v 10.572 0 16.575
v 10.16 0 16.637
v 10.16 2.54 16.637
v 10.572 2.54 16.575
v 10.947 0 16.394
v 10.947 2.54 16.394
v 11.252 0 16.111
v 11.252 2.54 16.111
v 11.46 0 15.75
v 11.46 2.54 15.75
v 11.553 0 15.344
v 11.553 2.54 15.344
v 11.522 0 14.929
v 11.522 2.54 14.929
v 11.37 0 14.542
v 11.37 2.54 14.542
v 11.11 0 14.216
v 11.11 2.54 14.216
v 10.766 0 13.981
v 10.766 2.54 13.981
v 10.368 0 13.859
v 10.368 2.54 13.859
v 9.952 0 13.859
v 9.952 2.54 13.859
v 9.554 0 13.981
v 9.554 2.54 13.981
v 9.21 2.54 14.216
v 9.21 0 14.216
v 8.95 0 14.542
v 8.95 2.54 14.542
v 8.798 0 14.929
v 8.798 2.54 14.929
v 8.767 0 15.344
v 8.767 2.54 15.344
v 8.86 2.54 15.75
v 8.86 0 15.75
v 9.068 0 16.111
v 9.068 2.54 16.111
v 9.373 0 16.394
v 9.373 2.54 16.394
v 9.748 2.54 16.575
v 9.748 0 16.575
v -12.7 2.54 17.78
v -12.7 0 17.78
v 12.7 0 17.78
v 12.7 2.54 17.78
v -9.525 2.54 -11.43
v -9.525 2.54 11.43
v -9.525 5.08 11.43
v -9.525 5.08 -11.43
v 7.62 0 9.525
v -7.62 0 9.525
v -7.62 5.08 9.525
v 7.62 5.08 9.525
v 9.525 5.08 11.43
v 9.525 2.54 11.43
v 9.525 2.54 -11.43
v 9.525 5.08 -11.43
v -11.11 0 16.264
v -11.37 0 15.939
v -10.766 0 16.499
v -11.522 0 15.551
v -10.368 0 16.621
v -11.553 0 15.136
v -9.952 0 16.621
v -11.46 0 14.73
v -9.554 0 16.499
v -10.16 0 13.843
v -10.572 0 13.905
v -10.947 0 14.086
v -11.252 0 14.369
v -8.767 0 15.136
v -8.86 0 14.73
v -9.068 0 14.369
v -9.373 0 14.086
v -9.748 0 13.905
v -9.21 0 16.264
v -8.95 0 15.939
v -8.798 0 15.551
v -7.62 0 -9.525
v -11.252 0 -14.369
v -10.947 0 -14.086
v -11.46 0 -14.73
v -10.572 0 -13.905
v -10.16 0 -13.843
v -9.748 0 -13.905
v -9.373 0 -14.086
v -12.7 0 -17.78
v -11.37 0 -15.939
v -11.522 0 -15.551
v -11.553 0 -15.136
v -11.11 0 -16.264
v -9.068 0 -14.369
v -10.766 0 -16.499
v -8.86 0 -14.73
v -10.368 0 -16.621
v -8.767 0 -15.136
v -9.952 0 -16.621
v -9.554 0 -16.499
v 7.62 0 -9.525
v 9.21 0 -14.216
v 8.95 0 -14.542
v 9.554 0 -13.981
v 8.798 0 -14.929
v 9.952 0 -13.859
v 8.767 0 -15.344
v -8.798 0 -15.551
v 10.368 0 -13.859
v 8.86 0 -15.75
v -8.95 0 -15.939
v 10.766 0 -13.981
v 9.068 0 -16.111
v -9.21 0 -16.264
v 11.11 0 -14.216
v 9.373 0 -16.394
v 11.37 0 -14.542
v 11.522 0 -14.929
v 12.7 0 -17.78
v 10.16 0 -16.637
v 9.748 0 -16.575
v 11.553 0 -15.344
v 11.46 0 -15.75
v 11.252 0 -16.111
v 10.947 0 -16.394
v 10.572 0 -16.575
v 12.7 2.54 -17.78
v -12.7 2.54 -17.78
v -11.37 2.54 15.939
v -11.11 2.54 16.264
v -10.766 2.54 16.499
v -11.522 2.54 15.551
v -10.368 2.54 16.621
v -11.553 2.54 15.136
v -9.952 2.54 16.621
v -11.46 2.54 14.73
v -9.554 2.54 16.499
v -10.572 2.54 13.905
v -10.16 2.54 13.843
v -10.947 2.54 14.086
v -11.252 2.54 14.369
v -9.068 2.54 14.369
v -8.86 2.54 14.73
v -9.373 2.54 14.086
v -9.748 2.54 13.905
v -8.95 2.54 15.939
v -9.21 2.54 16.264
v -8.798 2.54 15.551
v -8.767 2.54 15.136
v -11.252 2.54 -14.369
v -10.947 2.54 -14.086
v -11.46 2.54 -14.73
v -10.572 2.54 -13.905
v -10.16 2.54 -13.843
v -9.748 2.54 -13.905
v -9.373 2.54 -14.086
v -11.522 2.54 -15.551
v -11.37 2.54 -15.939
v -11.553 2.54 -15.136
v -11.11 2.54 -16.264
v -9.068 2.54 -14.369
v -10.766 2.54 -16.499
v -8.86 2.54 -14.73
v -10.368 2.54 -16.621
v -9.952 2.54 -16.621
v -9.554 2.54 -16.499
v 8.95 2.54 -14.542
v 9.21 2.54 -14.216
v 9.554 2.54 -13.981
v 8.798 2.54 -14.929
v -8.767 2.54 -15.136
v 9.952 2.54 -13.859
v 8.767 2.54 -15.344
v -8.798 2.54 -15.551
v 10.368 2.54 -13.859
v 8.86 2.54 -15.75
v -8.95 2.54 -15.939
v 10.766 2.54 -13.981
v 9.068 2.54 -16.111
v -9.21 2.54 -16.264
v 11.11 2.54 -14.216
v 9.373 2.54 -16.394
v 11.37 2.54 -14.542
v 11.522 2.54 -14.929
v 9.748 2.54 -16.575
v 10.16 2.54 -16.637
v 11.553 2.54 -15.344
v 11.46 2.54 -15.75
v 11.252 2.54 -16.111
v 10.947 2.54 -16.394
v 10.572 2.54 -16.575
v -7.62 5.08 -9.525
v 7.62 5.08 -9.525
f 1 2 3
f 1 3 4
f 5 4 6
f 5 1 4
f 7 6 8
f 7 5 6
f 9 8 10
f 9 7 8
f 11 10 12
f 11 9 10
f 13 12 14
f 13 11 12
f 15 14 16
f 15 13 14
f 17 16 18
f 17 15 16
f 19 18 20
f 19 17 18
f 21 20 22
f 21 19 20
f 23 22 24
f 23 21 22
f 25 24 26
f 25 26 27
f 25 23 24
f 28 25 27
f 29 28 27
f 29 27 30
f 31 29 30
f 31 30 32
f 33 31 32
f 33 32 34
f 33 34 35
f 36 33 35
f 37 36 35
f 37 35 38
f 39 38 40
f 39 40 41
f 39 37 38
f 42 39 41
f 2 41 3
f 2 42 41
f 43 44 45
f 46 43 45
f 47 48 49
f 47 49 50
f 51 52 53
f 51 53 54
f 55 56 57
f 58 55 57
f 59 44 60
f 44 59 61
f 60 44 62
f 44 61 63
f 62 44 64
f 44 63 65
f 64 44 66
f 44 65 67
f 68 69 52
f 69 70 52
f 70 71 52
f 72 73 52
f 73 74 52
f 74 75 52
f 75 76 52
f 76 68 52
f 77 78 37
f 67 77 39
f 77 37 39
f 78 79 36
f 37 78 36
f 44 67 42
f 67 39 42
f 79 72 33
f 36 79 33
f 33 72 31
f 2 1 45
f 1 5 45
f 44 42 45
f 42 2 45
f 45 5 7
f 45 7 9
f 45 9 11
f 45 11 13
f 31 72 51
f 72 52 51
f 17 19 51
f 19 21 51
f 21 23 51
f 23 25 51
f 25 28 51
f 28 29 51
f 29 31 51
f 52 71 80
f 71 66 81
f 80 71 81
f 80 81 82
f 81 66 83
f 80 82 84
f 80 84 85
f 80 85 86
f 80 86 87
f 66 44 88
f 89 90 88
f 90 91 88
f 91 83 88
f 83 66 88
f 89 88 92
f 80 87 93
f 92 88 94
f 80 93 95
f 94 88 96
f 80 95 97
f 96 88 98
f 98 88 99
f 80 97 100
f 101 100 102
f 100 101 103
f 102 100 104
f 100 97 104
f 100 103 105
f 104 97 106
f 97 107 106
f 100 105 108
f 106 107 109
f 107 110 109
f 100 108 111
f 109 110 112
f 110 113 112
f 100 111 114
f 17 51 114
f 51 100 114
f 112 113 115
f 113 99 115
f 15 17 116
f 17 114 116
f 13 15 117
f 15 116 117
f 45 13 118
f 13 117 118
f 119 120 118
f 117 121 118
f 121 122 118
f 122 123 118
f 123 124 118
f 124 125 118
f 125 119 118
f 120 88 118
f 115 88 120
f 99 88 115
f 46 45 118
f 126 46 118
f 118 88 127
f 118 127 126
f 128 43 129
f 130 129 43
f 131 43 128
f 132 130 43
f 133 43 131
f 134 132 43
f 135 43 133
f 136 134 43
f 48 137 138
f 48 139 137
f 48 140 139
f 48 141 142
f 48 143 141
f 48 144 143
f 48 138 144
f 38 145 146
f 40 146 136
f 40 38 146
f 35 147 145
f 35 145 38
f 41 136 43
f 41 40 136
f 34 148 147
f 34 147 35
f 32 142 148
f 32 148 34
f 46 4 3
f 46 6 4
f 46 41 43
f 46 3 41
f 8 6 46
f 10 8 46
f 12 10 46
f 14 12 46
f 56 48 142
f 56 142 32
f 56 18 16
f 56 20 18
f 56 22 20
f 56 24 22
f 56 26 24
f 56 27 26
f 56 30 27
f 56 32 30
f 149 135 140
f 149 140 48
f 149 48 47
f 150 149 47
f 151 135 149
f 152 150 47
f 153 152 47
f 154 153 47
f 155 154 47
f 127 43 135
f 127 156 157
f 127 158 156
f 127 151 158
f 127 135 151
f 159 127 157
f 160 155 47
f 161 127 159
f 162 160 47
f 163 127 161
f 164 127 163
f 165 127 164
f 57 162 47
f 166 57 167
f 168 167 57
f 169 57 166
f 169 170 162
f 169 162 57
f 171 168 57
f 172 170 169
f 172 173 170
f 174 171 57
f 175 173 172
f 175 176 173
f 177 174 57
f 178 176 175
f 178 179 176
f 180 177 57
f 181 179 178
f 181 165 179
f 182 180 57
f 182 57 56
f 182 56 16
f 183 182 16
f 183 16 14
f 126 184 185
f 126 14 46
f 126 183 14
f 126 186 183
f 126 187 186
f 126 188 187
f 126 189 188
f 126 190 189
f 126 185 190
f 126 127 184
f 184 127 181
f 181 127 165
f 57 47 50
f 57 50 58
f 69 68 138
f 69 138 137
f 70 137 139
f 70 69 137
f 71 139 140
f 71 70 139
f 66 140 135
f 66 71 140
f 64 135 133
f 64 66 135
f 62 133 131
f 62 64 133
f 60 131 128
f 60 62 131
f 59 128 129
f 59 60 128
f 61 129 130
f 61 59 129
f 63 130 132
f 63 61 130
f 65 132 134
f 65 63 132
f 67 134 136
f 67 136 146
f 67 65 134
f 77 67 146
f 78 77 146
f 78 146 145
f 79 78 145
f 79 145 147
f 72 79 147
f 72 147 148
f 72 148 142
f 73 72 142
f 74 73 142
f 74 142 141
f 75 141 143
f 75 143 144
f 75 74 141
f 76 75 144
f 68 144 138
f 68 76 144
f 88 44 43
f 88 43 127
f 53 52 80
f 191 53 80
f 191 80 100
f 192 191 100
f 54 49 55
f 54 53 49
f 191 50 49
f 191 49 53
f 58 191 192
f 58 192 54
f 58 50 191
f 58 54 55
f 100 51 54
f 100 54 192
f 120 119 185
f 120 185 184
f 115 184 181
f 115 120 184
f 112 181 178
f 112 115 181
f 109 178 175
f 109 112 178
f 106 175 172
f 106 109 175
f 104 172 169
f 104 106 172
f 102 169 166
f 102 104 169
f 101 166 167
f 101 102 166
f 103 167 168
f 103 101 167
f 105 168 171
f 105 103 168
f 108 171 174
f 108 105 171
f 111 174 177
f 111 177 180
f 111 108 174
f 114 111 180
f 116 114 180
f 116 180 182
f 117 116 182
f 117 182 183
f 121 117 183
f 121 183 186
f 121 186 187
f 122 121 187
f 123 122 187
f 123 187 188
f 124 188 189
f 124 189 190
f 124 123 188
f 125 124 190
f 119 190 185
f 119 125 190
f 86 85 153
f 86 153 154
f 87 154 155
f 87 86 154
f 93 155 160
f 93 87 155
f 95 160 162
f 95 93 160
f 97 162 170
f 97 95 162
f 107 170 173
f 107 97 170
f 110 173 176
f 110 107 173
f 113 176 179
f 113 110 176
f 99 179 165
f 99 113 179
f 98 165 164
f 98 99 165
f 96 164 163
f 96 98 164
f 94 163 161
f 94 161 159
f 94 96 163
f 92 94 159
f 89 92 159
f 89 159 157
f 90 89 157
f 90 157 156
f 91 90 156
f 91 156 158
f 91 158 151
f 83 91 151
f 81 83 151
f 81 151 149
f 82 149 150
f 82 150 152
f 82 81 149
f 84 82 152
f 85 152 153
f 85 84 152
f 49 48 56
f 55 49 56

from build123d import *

# Parameters (mm, degrees)
SKETCH1_W           = 19.05
SKETCH1_H           = 22.86
SKETCH1_W_2         = 15.24
SKETCH1_H_2         = 19.05
BOSS_EXTRUDE1_DEPTH = 5.08
SKETCH3_W           = 25.4
SKETCH3_H           = 35.56
SKETCH3_R           = 1.397
SKETCH3_W_2         = 19.05
SKETCH3_H_2         = 22.86
BOSS_EXTRUDE2_DEPTH = 2.54


with BuildPart() as part:
    # Sketch1 → Boss-Extrude1 (new body)
    with BuildSketch(Plane(origin=(0, 0, 0), x_dir=(1, 0, 0), z_dir=(0, 1, 0))):
        Rectangle(SKETCH1_W, SKETCH1_H)
        Rectangle(SKETCH1_W_2, SKETCH1_H_2, mode=Mode.SUBTRACT)
    extrude(amount=BOSS_EXTRUDE1_DEPTH)

    # Sketch3 → Boss-Extrude2 (add)
    with BuildSketch(Plane(origin=(0, 0, 0), x_dir=(1, 0, 0), z_dir=(0, 1, 0))):
        Rectangle(SKETCH3_W, SKETCH3_H)
        with Locations(Location((-10.16, 15.24, 0), (0, 0, 270))):
            Circle(SKETCH3_R, mode=Mode.SUBTRACT)
        with Locations(Location((10.16, 15.24, 0), (0, 0, 90))):
            Circle(SKETCH3_R, mode=Mode.SUBTRACT)
        with Locations(Location((-10.16, -15.24, 0), (0, 0, 90))):
            Circle(SKETCH3_R, mode=Mode.SUBTRACT)
        with Locations(Location((10.16, -15.24, 0), (0, 0, 270))):
            Circle(SKETCH3_R, mode=Mode.SUBTRACT)
        Rectangle(SKETCH3_W_2, SKETCH3_H_2, mode=Mode.SUBTRACT)
    extrude(amount=BOSS_EXTRUDE2_DEPTH)


solid = part.part
